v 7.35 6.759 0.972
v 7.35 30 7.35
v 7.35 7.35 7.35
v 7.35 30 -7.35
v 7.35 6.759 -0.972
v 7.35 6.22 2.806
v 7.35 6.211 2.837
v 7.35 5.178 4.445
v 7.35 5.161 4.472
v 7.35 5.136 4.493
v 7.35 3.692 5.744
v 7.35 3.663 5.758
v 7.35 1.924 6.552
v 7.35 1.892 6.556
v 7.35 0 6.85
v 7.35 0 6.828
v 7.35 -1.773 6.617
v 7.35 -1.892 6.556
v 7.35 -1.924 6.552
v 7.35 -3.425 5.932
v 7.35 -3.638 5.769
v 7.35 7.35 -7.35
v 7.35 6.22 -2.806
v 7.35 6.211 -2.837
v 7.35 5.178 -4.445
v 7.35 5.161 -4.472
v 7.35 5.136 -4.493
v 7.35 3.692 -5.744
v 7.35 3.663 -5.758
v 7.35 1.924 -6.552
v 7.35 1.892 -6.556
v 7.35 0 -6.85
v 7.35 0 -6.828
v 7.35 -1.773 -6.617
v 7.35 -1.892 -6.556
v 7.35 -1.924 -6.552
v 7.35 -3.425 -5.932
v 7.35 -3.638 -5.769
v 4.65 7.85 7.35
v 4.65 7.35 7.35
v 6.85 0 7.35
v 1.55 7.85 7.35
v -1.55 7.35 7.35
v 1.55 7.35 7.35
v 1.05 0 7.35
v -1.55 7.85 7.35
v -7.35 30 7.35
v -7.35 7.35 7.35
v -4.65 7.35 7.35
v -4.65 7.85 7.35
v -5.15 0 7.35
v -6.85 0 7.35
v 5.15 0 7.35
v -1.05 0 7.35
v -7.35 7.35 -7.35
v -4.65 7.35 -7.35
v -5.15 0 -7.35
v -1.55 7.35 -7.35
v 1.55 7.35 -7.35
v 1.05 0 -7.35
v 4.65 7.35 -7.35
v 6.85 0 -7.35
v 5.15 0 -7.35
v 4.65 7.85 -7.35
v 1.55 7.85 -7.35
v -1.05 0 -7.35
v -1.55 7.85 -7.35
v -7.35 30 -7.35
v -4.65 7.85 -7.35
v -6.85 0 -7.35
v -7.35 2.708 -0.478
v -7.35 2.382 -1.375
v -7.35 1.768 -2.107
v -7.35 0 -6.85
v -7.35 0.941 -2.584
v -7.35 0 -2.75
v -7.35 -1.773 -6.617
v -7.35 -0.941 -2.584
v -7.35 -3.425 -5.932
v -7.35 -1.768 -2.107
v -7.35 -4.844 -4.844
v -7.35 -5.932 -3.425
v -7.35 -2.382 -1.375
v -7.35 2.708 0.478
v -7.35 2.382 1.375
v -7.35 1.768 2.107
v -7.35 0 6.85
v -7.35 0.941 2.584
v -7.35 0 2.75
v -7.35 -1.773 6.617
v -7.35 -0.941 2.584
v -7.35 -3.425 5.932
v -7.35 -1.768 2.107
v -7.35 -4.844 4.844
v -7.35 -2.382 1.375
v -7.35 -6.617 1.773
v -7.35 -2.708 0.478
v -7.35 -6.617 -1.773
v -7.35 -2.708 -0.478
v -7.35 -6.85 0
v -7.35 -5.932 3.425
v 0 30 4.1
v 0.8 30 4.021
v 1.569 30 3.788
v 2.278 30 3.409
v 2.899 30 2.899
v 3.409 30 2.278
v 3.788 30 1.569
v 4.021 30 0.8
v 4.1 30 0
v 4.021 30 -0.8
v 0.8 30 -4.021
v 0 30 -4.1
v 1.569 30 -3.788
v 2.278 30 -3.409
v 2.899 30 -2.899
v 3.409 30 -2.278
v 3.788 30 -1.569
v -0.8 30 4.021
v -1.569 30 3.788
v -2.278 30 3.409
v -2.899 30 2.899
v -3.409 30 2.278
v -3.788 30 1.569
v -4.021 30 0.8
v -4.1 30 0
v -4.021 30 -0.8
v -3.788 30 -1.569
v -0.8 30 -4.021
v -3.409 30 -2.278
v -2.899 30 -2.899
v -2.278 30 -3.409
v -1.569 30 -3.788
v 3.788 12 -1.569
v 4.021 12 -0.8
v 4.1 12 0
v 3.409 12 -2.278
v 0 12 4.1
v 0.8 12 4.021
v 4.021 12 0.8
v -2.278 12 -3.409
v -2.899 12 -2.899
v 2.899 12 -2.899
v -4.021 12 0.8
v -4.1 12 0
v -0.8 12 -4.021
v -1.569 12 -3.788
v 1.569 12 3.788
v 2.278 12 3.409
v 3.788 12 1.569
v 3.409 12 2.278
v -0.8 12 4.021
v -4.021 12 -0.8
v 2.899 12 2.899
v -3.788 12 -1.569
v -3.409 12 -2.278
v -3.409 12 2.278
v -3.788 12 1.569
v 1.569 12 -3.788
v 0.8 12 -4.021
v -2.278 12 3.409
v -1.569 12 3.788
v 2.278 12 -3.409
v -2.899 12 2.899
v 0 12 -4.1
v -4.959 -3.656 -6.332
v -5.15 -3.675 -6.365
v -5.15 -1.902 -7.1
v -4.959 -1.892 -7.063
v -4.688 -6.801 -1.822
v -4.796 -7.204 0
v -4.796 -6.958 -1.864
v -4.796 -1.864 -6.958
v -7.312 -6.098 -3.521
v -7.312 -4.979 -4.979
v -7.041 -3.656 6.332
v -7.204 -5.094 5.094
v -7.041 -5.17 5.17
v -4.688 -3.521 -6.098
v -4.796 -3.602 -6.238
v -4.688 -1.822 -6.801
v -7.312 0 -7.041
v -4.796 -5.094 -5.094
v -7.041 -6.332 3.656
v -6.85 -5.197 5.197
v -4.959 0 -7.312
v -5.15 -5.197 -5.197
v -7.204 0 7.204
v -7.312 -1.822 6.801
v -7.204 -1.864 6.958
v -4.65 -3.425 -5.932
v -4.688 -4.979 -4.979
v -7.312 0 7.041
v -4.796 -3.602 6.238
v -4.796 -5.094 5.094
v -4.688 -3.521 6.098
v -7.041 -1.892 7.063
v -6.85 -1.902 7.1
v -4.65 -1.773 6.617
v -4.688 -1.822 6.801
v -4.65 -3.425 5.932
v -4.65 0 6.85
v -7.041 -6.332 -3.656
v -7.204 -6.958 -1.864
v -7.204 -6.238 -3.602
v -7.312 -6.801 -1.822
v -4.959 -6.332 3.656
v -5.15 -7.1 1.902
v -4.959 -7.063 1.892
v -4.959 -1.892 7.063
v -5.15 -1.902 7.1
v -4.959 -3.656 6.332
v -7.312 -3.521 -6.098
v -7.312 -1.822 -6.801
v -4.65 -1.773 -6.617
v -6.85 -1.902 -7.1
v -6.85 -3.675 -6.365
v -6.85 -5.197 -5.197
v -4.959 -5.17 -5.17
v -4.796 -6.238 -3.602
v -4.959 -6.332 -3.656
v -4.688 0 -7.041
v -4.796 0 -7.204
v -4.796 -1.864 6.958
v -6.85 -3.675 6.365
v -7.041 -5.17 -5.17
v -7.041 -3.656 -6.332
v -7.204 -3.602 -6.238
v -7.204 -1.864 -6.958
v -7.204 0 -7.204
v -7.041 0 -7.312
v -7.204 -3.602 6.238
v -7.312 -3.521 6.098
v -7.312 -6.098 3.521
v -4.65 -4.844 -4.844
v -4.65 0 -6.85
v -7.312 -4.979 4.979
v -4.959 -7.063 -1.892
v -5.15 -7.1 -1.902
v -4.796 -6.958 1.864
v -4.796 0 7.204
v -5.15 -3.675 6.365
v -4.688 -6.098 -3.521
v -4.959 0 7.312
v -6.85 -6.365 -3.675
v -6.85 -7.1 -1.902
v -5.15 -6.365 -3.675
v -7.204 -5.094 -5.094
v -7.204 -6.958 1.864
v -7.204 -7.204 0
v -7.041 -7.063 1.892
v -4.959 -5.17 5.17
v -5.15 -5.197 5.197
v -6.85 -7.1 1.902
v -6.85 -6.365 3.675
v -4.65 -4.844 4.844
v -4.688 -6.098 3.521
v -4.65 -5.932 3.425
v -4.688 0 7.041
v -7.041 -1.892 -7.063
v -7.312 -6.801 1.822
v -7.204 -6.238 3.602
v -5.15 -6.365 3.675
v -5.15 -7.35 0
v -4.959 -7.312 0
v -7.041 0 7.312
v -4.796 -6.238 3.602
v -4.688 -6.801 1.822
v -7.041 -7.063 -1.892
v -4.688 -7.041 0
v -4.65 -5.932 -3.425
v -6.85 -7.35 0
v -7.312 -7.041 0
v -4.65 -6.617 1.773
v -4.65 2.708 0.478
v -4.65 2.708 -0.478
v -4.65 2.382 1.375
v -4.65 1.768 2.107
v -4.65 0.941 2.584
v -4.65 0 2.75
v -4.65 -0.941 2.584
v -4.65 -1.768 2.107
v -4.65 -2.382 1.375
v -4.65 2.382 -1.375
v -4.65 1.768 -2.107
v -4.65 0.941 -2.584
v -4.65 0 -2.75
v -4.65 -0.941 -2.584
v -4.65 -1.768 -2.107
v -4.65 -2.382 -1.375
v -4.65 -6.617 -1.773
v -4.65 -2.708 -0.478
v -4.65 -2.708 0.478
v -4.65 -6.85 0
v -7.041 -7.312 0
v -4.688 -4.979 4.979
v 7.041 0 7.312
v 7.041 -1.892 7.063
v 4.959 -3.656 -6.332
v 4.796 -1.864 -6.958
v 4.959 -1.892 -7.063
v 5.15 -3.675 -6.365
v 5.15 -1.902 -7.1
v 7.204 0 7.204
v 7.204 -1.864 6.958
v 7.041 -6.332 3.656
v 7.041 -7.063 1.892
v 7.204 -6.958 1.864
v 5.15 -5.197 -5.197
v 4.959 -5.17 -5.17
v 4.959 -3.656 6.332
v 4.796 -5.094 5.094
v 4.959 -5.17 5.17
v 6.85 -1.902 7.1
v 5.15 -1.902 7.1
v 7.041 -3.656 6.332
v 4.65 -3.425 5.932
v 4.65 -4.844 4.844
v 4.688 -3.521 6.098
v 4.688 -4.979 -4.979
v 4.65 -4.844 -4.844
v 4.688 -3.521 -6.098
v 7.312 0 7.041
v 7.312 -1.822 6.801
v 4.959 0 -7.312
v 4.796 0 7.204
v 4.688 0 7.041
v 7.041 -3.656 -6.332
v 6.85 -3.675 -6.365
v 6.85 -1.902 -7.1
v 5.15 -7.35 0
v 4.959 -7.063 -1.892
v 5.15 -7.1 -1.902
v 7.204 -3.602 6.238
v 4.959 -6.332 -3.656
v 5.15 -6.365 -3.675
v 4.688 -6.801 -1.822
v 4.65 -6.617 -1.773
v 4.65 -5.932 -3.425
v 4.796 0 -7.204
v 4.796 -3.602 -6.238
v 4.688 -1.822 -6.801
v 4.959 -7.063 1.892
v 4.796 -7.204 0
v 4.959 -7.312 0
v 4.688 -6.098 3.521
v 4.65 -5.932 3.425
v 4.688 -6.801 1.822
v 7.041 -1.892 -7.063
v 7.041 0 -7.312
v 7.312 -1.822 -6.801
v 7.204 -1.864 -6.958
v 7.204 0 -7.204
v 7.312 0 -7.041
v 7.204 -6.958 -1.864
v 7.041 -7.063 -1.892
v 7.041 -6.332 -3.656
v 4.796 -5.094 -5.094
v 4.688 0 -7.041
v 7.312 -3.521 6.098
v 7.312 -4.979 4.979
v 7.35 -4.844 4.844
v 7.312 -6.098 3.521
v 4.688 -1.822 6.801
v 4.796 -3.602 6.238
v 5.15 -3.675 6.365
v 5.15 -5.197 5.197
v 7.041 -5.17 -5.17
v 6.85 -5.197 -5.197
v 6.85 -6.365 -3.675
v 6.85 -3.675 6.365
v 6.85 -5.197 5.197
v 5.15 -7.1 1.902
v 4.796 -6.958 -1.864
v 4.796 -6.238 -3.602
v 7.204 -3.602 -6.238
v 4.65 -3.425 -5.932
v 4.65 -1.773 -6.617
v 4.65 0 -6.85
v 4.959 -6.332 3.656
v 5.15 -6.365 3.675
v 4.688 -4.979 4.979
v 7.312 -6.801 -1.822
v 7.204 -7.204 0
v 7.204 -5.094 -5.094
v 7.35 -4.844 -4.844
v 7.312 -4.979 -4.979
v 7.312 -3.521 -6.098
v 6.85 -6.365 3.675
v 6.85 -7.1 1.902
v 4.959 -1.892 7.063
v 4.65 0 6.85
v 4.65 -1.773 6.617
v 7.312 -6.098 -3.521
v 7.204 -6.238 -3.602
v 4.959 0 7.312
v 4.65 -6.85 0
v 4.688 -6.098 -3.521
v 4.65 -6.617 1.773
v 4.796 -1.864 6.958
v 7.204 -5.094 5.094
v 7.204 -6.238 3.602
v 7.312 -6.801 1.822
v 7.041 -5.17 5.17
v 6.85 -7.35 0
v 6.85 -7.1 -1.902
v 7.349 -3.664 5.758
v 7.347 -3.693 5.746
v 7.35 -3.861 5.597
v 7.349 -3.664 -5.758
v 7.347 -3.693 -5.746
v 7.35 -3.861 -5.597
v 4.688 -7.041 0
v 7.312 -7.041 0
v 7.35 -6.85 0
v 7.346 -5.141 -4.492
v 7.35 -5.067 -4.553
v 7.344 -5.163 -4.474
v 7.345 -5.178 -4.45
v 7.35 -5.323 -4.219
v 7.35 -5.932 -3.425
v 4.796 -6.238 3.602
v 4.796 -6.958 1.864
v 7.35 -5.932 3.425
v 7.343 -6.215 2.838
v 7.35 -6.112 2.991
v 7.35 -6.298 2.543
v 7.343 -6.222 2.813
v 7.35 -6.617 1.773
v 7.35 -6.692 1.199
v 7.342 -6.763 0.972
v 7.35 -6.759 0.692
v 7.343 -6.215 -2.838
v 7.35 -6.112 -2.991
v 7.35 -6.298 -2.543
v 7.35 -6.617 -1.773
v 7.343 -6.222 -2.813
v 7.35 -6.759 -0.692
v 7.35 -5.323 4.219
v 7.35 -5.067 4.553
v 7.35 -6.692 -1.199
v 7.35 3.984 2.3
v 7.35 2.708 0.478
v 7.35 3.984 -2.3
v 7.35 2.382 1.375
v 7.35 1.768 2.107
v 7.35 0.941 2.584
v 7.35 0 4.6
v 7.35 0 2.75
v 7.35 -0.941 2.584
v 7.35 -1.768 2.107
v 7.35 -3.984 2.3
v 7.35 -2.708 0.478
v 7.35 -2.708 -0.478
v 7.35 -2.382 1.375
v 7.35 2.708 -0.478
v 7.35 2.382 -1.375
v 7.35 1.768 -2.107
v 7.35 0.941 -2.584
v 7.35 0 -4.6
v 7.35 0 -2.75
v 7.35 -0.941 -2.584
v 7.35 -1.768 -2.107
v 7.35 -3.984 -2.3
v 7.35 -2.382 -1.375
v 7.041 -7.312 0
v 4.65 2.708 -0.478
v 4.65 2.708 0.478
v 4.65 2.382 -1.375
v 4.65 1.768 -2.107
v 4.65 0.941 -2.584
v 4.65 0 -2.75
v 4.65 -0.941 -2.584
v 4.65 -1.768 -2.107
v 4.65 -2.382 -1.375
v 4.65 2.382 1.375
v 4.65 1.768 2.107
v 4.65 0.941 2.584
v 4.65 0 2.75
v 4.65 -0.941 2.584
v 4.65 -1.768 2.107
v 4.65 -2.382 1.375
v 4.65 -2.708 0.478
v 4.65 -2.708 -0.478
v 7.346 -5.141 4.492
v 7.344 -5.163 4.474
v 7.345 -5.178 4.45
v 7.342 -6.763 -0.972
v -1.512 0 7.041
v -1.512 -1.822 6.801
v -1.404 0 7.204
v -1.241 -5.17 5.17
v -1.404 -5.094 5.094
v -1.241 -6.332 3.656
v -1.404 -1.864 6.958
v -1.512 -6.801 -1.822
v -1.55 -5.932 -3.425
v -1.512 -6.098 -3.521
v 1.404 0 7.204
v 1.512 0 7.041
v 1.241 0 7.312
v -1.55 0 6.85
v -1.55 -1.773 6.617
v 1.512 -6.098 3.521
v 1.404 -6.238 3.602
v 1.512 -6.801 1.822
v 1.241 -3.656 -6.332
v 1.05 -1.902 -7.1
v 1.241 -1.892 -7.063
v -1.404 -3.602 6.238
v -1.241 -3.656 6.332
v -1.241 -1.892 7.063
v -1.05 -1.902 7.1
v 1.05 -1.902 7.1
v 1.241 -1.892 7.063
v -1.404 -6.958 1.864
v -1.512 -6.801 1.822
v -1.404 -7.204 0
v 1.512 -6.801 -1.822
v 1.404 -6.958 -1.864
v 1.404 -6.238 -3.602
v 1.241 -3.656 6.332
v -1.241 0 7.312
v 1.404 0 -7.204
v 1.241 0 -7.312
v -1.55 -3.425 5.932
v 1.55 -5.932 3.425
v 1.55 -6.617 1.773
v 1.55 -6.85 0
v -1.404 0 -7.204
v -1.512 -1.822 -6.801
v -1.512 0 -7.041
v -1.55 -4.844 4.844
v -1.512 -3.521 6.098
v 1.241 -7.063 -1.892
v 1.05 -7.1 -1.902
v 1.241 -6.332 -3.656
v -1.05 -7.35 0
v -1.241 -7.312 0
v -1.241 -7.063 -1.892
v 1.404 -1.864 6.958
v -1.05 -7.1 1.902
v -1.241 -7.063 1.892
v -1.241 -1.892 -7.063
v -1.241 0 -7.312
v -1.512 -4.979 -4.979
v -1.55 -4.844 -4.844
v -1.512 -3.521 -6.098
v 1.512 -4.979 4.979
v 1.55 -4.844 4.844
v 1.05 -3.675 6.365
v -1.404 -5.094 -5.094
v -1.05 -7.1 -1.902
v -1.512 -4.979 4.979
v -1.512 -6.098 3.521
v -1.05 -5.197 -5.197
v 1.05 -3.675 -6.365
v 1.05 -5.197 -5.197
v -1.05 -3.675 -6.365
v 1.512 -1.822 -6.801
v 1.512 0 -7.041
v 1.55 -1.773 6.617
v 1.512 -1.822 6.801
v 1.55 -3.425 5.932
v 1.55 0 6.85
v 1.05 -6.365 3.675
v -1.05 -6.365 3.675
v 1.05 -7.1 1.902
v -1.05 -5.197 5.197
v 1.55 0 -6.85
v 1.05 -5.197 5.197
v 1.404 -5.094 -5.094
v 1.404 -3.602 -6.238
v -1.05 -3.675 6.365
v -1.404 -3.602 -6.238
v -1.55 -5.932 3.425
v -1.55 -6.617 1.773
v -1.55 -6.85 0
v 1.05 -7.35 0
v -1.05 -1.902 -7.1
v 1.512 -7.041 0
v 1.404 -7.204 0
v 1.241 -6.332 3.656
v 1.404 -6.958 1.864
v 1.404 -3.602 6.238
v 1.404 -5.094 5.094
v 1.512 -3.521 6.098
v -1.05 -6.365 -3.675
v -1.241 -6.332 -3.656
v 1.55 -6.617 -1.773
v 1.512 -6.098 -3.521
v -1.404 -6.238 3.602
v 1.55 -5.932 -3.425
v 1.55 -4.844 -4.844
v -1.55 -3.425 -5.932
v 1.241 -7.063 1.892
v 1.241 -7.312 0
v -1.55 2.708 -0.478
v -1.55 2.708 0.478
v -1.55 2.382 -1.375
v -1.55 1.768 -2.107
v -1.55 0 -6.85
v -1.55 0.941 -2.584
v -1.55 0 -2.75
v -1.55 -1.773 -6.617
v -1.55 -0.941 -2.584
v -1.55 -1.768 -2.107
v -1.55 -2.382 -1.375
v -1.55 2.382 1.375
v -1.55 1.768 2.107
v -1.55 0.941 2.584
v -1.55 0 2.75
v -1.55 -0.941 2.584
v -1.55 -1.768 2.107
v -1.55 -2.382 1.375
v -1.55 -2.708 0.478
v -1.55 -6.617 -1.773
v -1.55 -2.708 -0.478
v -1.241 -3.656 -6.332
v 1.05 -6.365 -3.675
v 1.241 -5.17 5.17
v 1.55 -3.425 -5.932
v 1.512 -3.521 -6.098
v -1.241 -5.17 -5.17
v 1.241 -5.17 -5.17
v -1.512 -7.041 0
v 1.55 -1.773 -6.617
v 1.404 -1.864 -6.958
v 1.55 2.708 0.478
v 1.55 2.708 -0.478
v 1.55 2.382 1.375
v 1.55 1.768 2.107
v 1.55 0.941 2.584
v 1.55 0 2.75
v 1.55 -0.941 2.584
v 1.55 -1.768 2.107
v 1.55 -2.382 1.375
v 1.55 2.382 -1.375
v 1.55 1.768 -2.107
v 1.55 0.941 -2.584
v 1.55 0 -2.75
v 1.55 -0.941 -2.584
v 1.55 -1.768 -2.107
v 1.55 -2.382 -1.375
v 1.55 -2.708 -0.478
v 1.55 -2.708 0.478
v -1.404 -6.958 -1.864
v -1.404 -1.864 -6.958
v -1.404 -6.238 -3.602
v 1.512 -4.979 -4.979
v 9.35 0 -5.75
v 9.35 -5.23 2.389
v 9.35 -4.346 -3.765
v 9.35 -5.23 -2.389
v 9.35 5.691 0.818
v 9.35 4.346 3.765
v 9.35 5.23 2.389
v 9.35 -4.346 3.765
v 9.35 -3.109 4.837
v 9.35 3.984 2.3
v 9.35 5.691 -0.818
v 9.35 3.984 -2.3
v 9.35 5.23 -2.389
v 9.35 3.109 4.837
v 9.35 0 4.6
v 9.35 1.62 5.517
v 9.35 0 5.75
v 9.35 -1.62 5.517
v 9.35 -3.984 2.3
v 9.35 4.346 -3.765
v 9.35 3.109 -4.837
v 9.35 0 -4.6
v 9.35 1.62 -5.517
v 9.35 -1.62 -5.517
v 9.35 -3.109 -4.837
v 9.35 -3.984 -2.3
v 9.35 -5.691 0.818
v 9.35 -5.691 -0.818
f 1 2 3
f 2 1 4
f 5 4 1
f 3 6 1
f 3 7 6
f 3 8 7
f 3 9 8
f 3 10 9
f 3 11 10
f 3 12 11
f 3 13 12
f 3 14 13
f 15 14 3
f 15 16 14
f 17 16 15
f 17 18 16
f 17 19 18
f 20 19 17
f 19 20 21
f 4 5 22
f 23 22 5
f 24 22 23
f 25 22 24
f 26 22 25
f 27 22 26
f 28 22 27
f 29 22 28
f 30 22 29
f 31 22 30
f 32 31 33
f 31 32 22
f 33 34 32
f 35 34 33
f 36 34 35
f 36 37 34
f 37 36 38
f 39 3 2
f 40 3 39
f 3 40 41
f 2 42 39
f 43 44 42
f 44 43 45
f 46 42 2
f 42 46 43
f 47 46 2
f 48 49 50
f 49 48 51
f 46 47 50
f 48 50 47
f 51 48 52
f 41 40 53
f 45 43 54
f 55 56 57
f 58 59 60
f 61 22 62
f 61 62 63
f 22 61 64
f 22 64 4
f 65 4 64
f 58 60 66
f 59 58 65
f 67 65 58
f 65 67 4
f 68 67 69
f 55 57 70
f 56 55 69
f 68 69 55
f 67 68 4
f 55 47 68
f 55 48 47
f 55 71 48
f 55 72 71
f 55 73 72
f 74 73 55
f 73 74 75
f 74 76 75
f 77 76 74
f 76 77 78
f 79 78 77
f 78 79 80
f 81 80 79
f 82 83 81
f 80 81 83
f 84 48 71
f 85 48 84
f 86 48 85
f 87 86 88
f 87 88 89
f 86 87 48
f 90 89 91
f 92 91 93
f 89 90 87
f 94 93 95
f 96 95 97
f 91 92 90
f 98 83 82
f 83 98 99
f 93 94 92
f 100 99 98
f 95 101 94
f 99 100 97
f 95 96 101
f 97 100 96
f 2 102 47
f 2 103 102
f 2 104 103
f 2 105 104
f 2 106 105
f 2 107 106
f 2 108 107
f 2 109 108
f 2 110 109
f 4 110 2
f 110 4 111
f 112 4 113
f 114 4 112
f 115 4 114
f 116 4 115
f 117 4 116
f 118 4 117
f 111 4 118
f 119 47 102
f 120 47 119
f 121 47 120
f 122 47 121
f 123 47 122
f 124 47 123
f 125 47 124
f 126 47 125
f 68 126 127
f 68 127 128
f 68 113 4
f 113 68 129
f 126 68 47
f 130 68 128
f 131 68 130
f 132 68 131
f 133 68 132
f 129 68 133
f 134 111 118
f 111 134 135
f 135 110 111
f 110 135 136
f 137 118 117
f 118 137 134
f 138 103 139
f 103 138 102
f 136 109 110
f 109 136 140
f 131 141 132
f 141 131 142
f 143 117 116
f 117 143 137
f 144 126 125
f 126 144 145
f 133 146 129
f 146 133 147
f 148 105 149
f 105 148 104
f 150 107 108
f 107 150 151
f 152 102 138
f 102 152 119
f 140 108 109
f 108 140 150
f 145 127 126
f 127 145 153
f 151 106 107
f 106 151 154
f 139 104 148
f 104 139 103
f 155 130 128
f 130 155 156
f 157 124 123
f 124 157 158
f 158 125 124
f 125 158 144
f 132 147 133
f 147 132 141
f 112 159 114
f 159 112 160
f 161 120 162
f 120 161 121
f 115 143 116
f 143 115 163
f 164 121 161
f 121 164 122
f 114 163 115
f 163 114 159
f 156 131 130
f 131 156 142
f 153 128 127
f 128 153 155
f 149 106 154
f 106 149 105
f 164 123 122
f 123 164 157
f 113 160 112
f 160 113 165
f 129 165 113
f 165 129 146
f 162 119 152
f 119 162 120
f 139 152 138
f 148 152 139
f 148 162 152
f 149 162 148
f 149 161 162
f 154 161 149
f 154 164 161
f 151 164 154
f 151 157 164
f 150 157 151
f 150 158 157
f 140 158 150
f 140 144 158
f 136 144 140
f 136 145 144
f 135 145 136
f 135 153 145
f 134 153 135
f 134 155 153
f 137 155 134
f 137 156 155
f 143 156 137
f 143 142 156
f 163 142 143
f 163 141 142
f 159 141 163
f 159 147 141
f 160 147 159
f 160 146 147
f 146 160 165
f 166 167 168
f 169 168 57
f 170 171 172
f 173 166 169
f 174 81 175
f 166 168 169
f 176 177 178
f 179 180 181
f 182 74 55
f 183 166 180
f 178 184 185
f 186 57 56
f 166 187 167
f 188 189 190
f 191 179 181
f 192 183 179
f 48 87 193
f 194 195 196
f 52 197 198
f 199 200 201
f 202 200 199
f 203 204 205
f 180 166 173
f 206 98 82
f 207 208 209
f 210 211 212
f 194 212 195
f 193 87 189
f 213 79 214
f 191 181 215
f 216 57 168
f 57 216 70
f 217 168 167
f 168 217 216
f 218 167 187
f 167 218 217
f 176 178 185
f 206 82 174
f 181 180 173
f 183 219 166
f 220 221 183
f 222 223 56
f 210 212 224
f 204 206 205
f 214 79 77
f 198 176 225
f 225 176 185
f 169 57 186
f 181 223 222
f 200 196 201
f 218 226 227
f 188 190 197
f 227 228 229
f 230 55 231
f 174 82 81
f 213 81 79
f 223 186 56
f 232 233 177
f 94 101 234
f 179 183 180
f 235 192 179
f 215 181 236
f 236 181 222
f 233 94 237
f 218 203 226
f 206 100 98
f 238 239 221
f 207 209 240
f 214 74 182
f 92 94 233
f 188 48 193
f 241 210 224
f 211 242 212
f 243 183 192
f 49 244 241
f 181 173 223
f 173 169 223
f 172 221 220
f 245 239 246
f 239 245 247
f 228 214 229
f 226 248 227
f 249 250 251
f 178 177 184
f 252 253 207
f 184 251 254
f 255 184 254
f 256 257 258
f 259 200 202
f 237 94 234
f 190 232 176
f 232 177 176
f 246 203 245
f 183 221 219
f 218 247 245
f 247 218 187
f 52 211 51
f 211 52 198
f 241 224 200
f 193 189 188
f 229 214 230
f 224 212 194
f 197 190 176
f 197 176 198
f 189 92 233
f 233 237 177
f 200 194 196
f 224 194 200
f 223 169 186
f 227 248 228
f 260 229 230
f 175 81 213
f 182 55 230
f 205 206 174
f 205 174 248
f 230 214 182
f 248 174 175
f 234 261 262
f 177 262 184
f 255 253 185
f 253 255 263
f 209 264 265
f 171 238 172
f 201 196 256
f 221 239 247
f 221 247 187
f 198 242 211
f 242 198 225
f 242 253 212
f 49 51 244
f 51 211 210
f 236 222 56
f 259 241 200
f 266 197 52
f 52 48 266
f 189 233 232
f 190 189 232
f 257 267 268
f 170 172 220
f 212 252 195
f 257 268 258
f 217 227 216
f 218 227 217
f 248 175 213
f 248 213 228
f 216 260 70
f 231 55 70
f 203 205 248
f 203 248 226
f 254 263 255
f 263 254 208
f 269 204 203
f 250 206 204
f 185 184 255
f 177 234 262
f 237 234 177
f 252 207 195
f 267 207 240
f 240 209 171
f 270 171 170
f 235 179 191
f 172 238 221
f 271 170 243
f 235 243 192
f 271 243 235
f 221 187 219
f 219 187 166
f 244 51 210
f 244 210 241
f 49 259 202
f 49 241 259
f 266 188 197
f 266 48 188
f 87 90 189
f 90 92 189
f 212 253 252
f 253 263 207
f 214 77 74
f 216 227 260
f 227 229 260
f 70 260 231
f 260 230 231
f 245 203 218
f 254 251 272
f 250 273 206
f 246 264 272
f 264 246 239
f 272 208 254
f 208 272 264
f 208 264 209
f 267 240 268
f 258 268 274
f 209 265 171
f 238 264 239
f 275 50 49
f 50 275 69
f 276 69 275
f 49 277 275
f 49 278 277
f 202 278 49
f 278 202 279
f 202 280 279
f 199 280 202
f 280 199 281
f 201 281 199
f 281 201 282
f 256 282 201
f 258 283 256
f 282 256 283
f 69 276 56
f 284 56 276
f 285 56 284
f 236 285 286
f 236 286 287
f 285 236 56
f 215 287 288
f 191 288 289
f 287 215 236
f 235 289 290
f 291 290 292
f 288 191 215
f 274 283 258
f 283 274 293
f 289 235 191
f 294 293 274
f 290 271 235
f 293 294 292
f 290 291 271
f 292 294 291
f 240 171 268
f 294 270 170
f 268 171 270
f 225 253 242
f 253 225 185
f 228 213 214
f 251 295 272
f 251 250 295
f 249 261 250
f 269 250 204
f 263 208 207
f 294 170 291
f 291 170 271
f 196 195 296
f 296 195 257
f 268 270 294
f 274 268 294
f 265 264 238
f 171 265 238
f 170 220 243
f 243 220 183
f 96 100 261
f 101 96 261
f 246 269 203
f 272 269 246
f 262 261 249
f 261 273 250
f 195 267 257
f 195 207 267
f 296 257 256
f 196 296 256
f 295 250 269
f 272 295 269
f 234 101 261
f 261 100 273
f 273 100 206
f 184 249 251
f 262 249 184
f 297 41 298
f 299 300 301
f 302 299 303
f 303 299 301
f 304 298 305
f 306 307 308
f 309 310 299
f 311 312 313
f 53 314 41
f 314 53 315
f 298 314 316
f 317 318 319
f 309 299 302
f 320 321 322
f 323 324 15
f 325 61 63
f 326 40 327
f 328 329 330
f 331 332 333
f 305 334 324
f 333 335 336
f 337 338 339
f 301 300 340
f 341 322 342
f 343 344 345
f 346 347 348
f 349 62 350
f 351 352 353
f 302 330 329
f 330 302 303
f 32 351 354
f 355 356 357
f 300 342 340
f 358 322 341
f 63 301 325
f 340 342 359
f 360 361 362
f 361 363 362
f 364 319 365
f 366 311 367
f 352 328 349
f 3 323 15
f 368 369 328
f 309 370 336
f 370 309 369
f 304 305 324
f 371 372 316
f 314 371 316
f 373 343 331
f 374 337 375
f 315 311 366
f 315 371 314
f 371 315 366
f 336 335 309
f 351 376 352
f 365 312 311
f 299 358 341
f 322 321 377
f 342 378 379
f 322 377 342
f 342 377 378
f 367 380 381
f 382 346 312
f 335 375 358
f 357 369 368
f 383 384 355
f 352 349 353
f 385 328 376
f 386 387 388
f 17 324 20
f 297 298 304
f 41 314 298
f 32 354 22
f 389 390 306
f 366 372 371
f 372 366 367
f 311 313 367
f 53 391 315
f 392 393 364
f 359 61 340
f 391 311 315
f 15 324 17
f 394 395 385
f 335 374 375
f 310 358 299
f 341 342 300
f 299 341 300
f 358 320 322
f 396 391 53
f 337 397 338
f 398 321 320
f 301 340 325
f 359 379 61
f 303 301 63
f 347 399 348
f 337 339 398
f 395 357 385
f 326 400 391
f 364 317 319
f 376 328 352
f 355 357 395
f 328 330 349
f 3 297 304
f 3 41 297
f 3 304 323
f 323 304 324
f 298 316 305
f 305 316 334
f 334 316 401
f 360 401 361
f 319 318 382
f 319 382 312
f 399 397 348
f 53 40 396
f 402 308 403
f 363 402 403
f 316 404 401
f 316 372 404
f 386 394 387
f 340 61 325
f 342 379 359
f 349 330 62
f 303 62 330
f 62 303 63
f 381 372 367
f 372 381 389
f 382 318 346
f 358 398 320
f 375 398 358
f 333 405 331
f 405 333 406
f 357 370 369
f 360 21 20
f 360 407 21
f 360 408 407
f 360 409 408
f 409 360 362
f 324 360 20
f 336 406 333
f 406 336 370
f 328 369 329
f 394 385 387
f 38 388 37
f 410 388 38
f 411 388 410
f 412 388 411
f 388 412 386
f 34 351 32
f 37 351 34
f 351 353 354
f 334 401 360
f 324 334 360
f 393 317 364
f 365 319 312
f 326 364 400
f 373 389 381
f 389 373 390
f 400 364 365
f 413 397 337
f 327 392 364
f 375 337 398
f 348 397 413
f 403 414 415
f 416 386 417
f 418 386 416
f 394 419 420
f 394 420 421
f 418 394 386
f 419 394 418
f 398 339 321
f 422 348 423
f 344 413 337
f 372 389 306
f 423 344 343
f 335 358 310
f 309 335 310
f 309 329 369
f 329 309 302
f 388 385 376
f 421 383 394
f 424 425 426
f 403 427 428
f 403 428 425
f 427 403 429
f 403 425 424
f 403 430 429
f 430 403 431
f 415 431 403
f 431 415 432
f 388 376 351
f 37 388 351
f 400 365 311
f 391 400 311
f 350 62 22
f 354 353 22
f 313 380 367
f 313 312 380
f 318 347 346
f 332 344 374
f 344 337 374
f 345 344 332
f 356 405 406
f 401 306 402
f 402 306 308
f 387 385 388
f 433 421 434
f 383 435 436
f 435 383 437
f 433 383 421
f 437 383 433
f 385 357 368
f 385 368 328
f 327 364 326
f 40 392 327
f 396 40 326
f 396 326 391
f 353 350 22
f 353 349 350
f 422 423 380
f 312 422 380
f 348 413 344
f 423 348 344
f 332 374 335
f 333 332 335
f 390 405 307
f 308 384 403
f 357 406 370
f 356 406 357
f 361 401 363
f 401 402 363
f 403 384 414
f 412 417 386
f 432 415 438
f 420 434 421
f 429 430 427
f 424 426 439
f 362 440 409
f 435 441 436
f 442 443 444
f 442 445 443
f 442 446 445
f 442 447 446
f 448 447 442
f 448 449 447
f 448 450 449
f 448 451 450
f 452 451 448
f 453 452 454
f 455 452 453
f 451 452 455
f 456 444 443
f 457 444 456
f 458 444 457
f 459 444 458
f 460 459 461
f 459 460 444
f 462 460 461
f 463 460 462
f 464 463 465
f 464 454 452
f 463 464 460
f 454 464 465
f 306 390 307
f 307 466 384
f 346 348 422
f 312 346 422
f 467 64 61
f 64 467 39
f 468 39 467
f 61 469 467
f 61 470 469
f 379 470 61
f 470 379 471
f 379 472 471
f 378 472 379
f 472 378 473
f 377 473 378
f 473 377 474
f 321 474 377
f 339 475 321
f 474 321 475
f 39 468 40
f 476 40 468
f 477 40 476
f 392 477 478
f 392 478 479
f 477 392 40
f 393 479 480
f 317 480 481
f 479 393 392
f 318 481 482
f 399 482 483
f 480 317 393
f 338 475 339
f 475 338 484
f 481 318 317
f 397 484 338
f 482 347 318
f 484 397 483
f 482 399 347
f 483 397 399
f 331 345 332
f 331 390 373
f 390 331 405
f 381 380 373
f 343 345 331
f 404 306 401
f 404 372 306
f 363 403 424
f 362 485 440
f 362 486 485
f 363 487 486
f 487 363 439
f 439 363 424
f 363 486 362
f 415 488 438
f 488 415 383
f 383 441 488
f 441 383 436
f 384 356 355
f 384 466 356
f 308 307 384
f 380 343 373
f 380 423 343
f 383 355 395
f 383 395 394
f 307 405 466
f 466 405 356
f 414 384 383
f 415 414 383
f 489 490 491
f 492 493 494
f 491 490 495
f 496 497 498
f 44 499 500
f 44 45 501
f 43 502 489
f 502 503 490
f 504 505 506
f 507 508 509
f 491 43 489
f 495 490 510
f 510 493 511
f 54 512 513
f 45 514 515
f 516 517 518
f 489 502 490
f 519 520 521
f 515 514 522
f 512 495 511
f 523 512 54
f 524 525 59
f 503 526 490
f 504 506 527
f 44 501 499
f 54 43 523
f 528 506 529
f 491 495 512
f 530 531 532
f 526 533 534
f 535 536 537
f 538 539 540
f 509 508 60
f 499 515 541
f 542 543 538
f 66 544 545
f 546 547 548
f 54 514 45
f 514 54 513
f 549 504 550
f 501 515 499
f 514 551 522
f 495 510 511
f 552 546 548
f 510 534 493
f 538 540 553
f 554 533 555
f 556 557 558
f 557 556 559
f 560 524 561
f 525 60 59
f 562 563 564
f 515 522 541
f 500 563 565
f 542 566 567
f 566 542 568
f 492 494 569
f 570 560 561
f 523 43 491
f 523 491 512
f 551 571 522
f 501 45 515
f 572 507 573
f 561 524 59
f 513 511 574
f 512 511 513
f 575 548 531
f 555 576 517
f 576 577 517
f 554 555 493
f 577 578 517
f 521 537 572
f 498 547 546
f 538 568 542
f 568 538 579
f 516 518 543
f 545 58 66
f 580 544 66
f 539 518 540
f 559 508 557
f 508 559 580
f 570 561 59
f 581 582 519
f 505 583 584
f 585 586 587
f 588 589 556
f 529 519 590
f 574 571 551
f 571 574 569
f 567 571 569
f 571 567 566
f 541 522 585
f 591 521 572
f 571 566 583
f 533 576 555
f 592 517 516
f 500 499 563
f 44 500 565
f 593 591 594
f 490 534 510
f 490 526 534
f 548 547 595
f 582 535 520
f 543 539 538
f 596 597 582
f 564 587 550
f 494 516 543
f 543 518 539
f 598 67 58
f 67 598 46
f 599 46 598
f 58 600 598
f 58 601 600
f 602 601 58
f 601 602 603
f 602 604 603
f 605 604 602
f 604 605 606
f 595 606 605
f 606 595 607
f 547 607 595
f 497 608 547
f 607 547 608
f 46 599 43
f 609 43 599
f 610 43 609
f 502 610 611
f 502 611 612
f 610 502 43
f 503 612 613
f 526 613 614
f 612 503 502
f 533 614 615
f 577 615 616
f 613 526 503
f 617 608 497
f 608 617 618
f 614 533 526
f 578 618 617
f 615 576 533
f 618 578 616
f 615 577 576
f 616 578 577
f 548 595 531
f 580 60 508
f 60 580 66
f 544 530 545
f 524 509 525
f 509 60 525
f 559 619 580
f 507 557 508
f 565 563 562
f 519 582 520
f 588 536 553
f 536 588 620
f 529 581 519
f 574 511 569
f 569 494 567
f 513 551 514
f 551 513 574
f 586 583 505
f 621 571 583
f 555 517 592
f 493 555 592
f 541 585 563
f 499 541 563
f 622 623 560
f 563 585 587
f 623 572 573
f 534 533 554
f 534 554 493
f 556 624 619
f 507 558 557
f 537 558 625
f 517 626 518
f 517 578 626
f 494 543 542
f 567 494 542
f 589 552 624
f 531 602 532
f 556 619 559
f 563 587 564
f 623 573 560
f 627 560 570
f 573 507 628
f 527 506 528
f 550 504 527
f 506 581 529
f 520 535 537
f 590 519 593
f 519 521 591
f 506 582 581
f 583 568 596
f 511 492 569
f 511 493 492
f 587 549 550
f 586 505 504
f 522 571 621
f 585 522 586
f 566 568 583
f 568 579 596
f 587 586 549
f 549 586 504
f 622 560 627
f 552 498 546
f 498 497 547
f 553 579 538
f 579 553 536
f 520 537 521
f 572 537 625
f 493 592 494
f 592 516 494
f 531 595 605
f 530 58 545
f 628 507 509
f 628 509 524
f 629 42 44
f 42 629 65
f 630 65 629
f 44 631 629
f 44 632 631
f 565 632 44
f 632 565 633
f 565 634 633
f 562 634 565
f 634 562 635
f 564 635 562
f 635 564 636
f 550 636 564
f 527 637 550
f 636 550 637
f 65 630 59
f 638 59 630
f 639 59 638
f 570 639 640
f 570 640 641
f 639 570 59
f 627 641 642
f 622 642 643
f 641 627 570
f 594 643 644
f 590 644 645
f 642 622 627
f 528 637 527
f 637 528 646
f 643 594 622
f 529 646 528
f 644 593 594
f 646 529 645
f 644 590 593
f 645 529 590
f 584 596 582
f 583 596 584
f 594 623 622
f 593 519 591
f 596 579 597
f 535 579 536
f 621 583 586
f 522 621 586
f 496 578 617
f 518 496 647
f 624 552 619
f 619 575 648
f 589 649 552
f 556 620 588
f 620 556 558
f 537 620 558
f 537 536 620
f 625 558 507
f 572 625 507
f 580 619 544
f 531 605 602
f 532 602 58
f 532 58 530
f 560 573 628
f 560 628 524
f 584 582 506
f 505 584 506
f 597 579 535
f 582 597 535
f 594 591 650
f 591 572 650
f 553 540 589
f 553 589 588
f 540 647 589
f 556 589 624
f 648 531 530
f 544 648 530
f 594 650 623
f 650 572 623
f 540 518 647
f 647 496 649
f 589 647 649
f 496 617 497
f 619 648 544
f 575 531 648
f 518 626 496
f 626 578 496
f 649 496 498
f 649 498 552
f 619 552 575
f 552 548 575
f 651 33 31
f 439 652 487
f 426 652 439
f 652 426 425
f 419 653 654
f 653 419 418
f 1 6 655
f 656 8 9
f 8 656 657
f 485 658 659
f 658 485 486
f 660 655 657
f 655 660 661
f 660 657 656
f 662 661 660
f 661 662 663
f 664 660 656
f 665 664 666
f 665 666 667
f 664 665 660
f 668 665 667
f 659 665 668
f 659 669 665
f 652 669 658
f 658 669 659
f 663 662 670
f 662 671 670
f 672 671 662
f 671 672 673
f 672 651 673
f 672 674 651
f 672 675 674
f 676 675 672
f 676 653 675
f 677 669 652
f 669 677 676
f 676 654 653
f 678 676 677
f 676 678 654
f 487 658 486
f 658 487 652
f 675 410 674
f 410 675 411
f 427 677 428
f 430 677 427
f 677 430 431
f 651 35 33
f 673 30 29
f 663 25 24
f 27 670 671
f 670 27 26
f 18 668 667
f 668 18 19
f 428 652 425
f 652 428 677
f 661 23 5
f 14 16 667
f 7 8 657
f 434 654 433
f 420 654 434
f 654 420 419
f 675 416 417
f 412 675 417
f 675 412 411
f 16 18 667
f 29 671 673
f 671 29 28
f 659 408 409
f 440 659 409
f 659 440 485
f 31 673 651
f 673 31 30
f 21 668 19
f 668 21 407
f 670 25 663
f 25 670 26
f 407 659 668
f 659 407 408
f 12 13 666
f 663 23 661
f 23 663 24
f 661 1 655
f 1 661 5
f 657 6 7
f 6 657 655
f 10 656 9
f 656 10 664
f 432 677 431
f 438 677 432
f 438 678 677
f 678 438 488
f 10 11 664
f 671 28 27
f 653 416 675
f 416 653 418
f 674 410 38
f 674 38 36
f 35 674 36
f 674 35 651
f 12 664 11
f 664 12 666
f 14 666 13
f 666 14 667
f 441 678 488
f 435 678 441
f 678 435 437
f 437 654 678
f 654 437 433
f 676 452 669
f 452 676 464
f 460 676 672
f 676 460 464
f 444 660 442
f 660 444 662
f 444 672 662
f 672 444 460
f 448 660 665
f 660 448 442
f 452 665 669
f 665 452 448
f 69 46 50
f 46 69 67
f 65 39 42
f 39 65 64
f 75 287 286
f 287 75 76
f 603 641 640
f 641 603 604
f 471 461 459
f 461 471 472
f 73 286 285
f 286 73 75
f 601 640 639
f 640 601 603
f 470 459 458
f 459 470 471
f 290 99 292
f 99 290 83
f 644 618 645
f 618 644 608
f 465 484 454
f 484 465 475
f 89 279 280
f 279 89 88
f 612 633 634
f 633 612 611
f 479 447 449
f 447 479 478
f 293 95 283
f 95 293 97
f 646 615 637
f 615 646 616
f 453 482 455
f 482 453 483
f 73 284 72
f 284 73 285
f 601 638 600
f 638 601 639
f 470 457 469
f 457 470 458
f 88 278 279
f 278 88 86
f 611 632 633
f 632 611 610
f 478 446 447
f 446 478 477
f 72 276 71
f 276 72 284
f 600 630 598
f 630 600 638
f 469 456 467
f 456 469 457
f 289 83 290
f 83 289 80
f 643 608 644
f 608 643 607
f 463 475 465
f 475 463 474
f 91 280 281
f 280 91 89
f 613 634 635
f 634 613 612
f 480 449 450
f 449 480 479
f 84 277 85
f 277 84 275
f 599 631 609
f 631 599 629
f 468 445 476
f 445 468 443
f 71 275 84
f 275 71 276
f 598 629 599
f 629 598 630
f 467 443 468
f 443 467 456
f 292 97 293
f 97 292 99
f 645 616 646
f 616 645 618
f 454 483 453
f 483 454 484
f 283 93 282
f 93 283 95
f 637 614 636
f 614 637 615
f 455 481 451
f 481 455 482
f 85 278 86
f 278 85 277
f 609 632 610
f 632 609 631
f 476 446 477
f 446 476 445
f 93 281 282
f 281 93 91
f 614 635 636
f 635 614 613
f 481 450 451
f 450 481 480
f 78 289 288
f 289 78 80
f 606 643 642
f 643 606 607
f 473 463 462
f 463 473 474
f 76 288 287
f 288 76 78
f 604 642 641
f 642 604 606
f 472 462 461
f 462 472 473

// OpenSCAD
/* [Main] */

s=14.7;

difference(){
    translate([-s/2,10,-s/2])
    cube([s,20,s]);
    
    translate([0,12,0])
    rotate([-90,0,0])
    cylinder(d=8.2, h=25, $fn=32);
}

// First head kind ("example" show them all but is not printable)
gopro_primary="triple"; // [example,triple,double]
// The other head kind (only for the triple or double primary kind)
gopro_secondary_what="none"; // [double,triple,rod,clamp,none]
// If ever you rotate the seconday head you will probably need to enable support to print it
gopro_secondary_rotated=1; // [0:false,1:true]

// Optional axis-to-axis extension rod (hence, it cannot be less than 20.7)
gopro_ext_len=21;
// The wall thickness of the extension rod (2 to 6mm are good values)
gopro_ext_th=3;

/* [Rod and captive nut] */

// This tab is useful only if you have selected "rod" as the secondary head. The optional rod diameter (also the captive nut internal diameter)
gopro_captive_rod_id= 3.8;
// The angle the rod makes with the axis (0 is colinear, 90 is a right angle)
gopro_captive_rod_angle= 45; // [0:90]
// Optional captive nut thickness with freeplay (tightest would be 3.2)
gopro_rod_nut_th= 3.6;
// Optional captive nut diameter with freeplay (from corner to corner)
gopro_rod_nut_od= 8.05;
// How much is the protruding output of the rod on the rod attachment (can be zero), useful if you don't want a captive nut with still a tight coupling
gopro_captive_protruding_h= 0.5;

/* [Clamp/bar mount] */

// This tab is useful only if you have selected "clamp" as the secondary head.  The optional (handle)bar diameter
gopro_bar_rod_d= 17;
// How thick is the ring around the bar
gopro_bar_th= 3.2;
// How big is the gap between the jaws
gopro_bar_gap= 10;
// The jaw screw diameter
gopro_bar_screw_d= 4;
// The diameter of the head of the screw
gopro_bar_screw_head_d= 6.2;
// The diameter of the nut of the screw from corner to corner (can be zero)
gopro_bar_screw_nut_d= 6.01;
// How thick are the shoulders on which to bolt (each side)
gopro_bar_screw_shoulder_th=4.5;
// Whether to reverse the bolt orientation (from which side you will screw the bolt, defaut is from the joint)
gopro_bar_screw_reversed=true; // [true,false]

/* [Hidden] */

// The gopro connector itself (you most probably do not want to change this but for the first two)

// The locking nut on the gopro mount triple arm mount (keep it tight)
gopro_nut_d= 9.2;
// How deep is this nut embossing (keep it small to avoid over-overhangs)
gopro_nut_h= 2;
// Hole diameter for the two-arm mount part
gopro_holed_two= 5;
// Hole diameter for the three-arm mount part
gopro_holed_three= 5.5;
// Thickness of the internal arm in the 3-arm mount part
gopro_connector_th3_middle= 3.1;
// Thickness of the side arms in the 3-arm mount part
gopro_connector_th3_side= 2.7;
// Thickness of the arms in the 2-arm mount part
gopro_connector_th2= 3.04;
// The gap in the 3-arm mount part for the two-arm
gopro_connector_gap= 3.1;
// How round are the 2 and 3-arm parts
gopro_connector_roundness= 1;
// How thick are the mount walls
gopro_wall_th= 3;

gopro_connector_wall_tol=0.5+0;
gopro_tol=0.04+0;

// Can be queried from the outside
gopro_connector_z= 2*gopro_connector_th3_side+gopro_connector_th3_middle+2*gopro_connector_gap;
gopro_connector_x= gopro_connector_z;
gopro_connector_y= gopro_connector_z/2+gopro_wall_th;

///////////////////////////////////////////////////////////////////////
//
// GoPro Hero mount and joint (gopro_mounts_mooncactus.scad) - Rev 1.03
//
///////////////////////////////////////////////////////////////////////
//
// CC-BY-NC 2013 jeremie.francois@gmail.com
// http://www.thingiverse.com/thing:62800
// http://betterprinter.blogspot.com
//

// It slices neatly on an ultimaker with the following parameters
//
// 0.1 mm layers (for better look & more compact FDM) -- 0.15 is still OK (and faster)
// 0.8 mm walls (loops->infill->perimeters)
// 0.8 mm bottom/top
// 100% fill (probably safer, though 30% is quite OK)
//
// Rev 1.01: fixed printing angle vs captive nut slot, added a slight freeplay
// Rev 1.02: added handle/bar mount and rounded the angles of the rod mount
// Rec 1.03: examples and first release (20130317-1234)

/* ****************************************************************

HOW TO USE IN YOUR OWN DESIGNS

use <gopro_mounts_mooncactus.scad>

// Create a "triple" gopro connector
gopro_connector("triple");

// Create a "triple" gopro connector without the locking nut shape
translate([30,0,0])
	gopro_connector("triple", withnut=false);

// Create a "double" gopro connector
translate([60,0,0])
	gopro_connector("double");

// Add a bar mount/clamp to one of the connector
translate([90,0,0])
gopro_bar_clamp(
	rod_d= 31, // rod diameter
	th= 3.2, // main thickness
	gap= 2.4, // space between the clamps
	screw_d= 3, // screw diameter
	screw_head_d= 6.2, // screw head diameter
	screw_nut_d= 6.01, // nut diameter from corner to corner
	screw_shoulder_th=4.5, // thickness of the shoulder on which the nut clamps
	screw_reversed=false	 // true to mirror the orientation of the clamp bolts
);

// Extends a connector with a mount for a rod and an optional embedded nut
translate([120,0,0])
gopro_rod_connect(
	rod_id=3.8, // rod diameter
	angle=80,  // rod angle (0 is straight, 90 is a right turn)
	nut_th=3.2, // embedded nut thickness (can be zero to disable the embedded nut)
	nut_od=7.9 // nut diameter from corner to corner
);

// How to build a linear extruded bar extender
translate([0,65,0])
{
	gopro_connector("double");
	gopro_extended(len=50, th=3)
		scale([1,-1,1])
				gopro_connector("triple");
}

// The following dimensions are useful to attach the mount to your design:
	gopro_connector_z= 14.7;
	gopro_connector_x= 14.7;
	gopro_connector_y= 10.35;


// Finally, note that the arm are designed in a way which is not the best orientation to print: you would better rotate them with, eg. rotate([0,90,0])

**************************************************************** */



// To generate the sample set in bash, just copy/paste the following in a terminal:
/*
for kind in double triple; do
	for angle in 30 80; do
		through=true
		[[ $angle == 0 ]] && through=false
		openscad -D print_it=true -D gopro_primary="\"$kind\"" -D gopro_captive_rod_angle=$angle -o gmb_${kind}_${angle}.stl gopro_mount_bit.scad
	done
	openscad -D print_it=true -D gopro_primary="\"$kind\"" -D gopro_rod_nut_th=0 -o gmb_${kind}_simple.stl gopro_mount_bit.scad
done
*/


//
// ================ Full (colored) example (for openscad & command line)
//
gopro_ext_len_real= (gopro_ext_len > 2*gopro_connector_y ? gopro_ext_len : 0);
if(gopro_primary=="example")
{
	gopro_connector("triple", withnut=true);
	
	color([1,0.2,0.2])
		gopro_bar_clamp(
			rod_d= gopro_bar_rod_d, th=gopro_bar_th, gap=gopro_bar_gap,
			screw_d= gopro_bar_screw_d, screw_head_d= gopro_bar_screw_head_d, screw_nut_d= gopro_bar_screw_nut_d, screw_shoulder_th= gopro_bar_screw_shoulder_th,
			screw_reversed= gopro_bar_screw_reversed	);
			
	rotate([0,180,130]) color([0.2,0.2,1])
		gopro_connector("double");
		
	rotate([0,180,130]) color([0,0.8,0])
		gopro_rod_connect(nut_th=gopro_rod_nut_th, nut_od=gopro_rod_nut_od, rod_id=gopro_captive_rod_id, angle=gopro_captive_rod_angle);

	translate([-35,-10,0]) color([0.6,0.6,0.6])
	rotate([0,0,10])
	{
		gopro_connector("double");
		gopro_extended(len=gopro_ext_len, th=gopro_ext_th)
		{
			scale([1,-1,1])	gopro_connector("triple");
			// or (eg.)
//			translate([0,-2*gopro_connector_y,0]) gopro_bar_clamp(rod_d= 20, th= 5, gap= 5, screw_d= 3, screw_head_d= 6.2, screw_nut_d= 6.01, screw_shoulder_th=4.5, screw_reversed=true);
		}
	}
}
else // useful blocks
{
	//
	// ================ Printable standalone blocks (for the customizer)
	//
	rotate([0,90,0])
	{
		if(gopro_primary=="triple")
			gopro_connector("triple", withnut=true);
		else
			gopro_connector("double");

		gopro_extended(len=gopro_ext_len_real, th=gopro_ext_th) {}
		translate([0,gopro_ext_len_real>0 ? gopro_ext_len_real-gopro_connector_y*2 : 0,0])
		{
			rotate([0,gopro_secondary_rotated?-90:0,0])
			if(gopro_secondary_what=="double" || gopro_secondary_what=="triple")
			{
				translate([0,gopro_connector_y*2,0])
					scale([1,-1,1])
				if(gopro_secondary_what=="triple")
					gopro_connector("triple", withnut=true);
				else if(gopro_secondary_what=="double")
					gopro_connector("double");
			}
			else if(gopro_secondary_what=="rod" && gopro_captive_rod_id>0) // Optional captive nut
			{
				gopro_rod_connect(nut_th=gopro_rod_nut_th, nut_od=gopro_rod_nut_od, rod_id=gopro_captive_rod_id, angle=gopro_captive_rod_angle);
			}
			else if(gopro_secondary_what=="clamp" && gopro_bar_rod_d>0) // Optional bar mount (can't be both!)
			{
				rotate([0,90,0])
					gopro_bar_clamp(
						rod_d= gopro_bar_rod_d,
						th= gopro_bar_th,
						gap= gopro_bar_gap,
						screw_d= gopro_bar_screw_d,
						screw_head_d= gopro_bar_screw_head_d,
						screw_nut_d= gopro_bar_screw_nut_d,
						screw_shoulder_th= gopro_bar_screw_shoulder_th,
						screw_reversed= gopro_bar_screw_reversed
					);
			}
		}
	}
}



//
// ============================= GOPRO CONNECTOR =============================
//

module gopro_torus(r,rnd)
{
	translate([0,0,rnd/2])
		rotate_extrude(convexity= 10)
			translate([r-rnd/2, 0, 0])
				circle(r= rnd/2, $fs=0.2);
}

module gopro_rcyl(r,h, centered, rnd=1)
{
	translate([0,0,center ? -h/2 : 0])
	hull() {
		translate([0,0,0]) gopro_torus(r=r, rnd=rnd);
		translate([0,0,h-rnd]) gopro_torus(r=r, rnd=rnd);
	}
}

module gopro_connector(version="double", withnut=true, captive_nut_th=0, captive_nut_od=0, captive_rod_id=0, captive_nut_angle=0)
{
	module gopro_profile(th)
	{
		hull()
		{
			gopro_torus(r=gopro_connector_z/2, rnd=gopro_connector_roundness);
			translate([0,0,th-gopro_connector_roundness])
				gopro_torus(r=gopro_connector_z/2, rnd=gopro_connector_roundness);
			translate([-gopro_connector_z/2,gopro_connector_z/2,0])
				cube([gopro_connector_z,gopro_wall_th,th]);
		}
	}
	difference()
	{
		union()
		{
			if(version=="double")
			{
				for(mz=[-1:2:+1]) scale([1,1,mz])
						translate([0,0,gopro_connector_th3_middle/2 + (gopro_connector_gap-gopro_connector_th2)/2]) gopro_profile(gopro_connector_th2);
			}
			if(version=="triple")
			{
				translate([0,0,-gopro_connector_th3_middle/2]) gopro_profile(gopro_connector_th3_middle);
				for(mz=[-1:2:+1]) scale([1,1,mz])
					translate([0,0,gopro_connector_th3_middle/2 + gopro_connector_gap]) gopro_profile(gopro_connector_th3_side);
			}

			// add the common wall
			translate([0,gopro_connector_z/2+gopro_wall_th/2+gopro_connector_wall_tol,0])
				cube([gopro_connector_z,gopro_wall_th,gopro_connector_z], center=true);

			// add the optional nut emboss
			if(version=="triple" && withnut)
			{
				translate([0,0,gopro_connector_z/2-gopro_tol])
				difference()
				{
					cylinder(r1=gopro_connector_z/2-gopro_connector_roundness/2, r2=11.5/2, h=gopro_nut_h+gopro_tol);
					cylinder(r=gopro_nut_d/2, h=gopro_connector_z/2+3.5+gopro_tol, $fn=6);
				}
			}
		}
		// remove the axis
		translate([0,0,-gopro_tol])
			cylinder(r=(version=="double" ? gopro_holed_two : gopro_holed_three)/2, h=gopro_connector_z+4*gopro_tol, center=true, $fs=1);
	}
}

//
// ============================= CAPTIVE NUT/ROD =============================
//

module gopro_rod_connect(nut_od, rod_id, nut_th, angle=0)
{
	if( (nut_th>0 && nut_od>0) || rod_id>0 )
	translate([0,gopro_connector_z,0])
	{
		difference()
		{
			// Main body mass
			difference()
			{
				hull()
				{
					translate([0,-gopro_connector_z/2+gopro_wall_th,0]) // attachment
						cube([gopro_connector_z,gopro_tol,gopro_connector_z], center=true);

					// main cylinder
					translate([gopro_connector_z/8,gopro_connector_z/4,0]) scale([0.75,0.5,1]) // optional
					gopro_rcyl(r=gopro_connector_z/2, h=gopro_connector_z, center=true, rnd=3);

					// nozzle
					rotate([0,0,angle])
						translate([0,gopro_connector_z/2-gopro_tol,0])
							rotate([-90,0,0])
							{
								hull()
								{
									translate([0,0,-1.5]) gopro_torus(r=gopro_connector_z/2, rnd=1.5);
									translate([0,0,gopro_captive_protruding_h-1])
									gopro_torus(r=nut_od/2, rnd=1);
								}
							}
				}

				// Captive nut slot
				if(nut_th>0 && nut_od>0)
				{
					translate([0,0,0])
						rotate([0,(angle<18)?180:0,angle]) // easier print only for small angles
							hull()
					{
						rotate([-90,0,0]) cylinder(r=nut_od/2, h=nut_th+2*gopro_tol, $fn=6, center=true);
						translate([gopro_connector_z,0,0])
							rotate([-90,0,0]) cylinder(r=nut_od/2, h=nut_th+2*gopro_tol, $fn=6, center=true);
					}
				}
			}

			// Carve the rod void
			if(rod_id>0)
			{
				rotate([0,0,angle])
				{
					if(angle>=80 || angle<=-80)
						rotate([-90,30,0])
							cylinder(r=rod_id/2, h=gopro_connector_z+2*gopro_captive_protruding_h+2*gopro_tol, $fs=0.2, center=true);
					else
						translate([0,gopro_wall_th+gopro_tol*2-nut_th/2,0])
							rotate([-90,30,0])
							cylinder(r=rod_id/2, h=gopro_connector_z/2+gopro_captive_protruding_h+gopro_tol, $fs=0.2);
				}
			}
		}
	}
}

//
// ============================= BAR CLAMP =============================
//

module gopro_bar_clamp(
	rod_d= 31,
	th= 3.2,
	gap= 2.4,
	screw_d= 3,
	screw_head_d= 6.2,
	screw_nut_d= 6.01,
	screw_shoulder_th=4.5,
	screw_reversed=1
	)
{
	module clamp_profile(r)
	{
		scale([r,r,1])
			translate([0,rod_d/2,0])
				cylinder(r=rod_d/2 + th,h=gopro_tol);
	}
	
	screw_x= rod_d/2+screw_head_d/2;
	translate([0,gopro_connector_z,0])
	difference()
	{
		hull()
		{
			translate([0,-gopro_connector_z/2+gopro_wall_th,0]) // attachment
				cube([gopro_connector_z,gopro_tol,gopro_connector_z], center=true);

			clamp_profile(1);
			for(m=[-1:2:+1]) scale([1,1,m])
				translate([0,0,-gopro_connector_z/2])
					clamp_profile((rod_d-0.8)/rod_d);

			// Shoulder screw support
			for(m=[-1:2:-1]) scale([m,1,1])
			{
				translate([screw_x,rod_d/2,gopro_tol/2])
					rotate([90,0,0])
						translate([0,0,-(gap+th*2)/2])
							cylinder(r=screw_head_d/2+0.78,h=gap+th*2);
			}
			
		}

		translate([0,rod_d/2,0])
		{
			// Main hole and gap
			translate([0,0,-gopro_tol-gopro_connector_z/2])
				cylinder(r=rod_d/2,h=gopro_connector_z+2*gopro_tol, $fs=1); // inner
				
			// Gap
            translate([-gopro_connector_z,0,0]) //ch
			cube([screw_x*2 + screw_head_d*2, gap, gopro_connector_z+2*gopro_tol+1],center=true);

			// Screws
			for(mx=[-1:2:-1]) scale([mx,1,1]) //ch mx=[-1:2:+1]
			{
				translate([screw_x,0,0]) rotate([90,0,0])
				{
						translate([0,0,-rod_d/2-screw_shoulder_th]) cylinder(r=screw_d/2,h=rod_d+2*screw_shoulder_th,$fs=0.5); // screw axis
						if(screw_head_d>0)
							scale([1,1,screw_reversed?-1:1])
								translate([0,0,gap/2+screw_shoulder_th])
									cylinder(
										r1=screw_head_d/2,
										r2=1.5*screw_head_d/2,
										h=rod_d/2,$fs=0.5); // screw head
						if(screw_nut_d>0)
							scale([1,1,screw_reversed?1:-1])
								translate([0,0,gap/2+screw_shoulder_th])
									rotate([0,0,30])
										cylinder(
											r1=screw_nut_d/2,
											r2=1.5*screw_nut_d/2,
											h=rod_d/2,$fn=6); // screw nut
				}
			}

		}
	}
}


module gopro_extended(len, th=3)
{
	linlen= len - 2*gopro_connector_y;
	if(linlen>0)
	{
		translate([0,gopro_connector_y,0])
		{
			rotate([90,0,0])
				translate([0,0,-linlen/2])
					linear_extrude(height = linlen, center = true, convexity = 10)
			{
				for(r=[45:90:360]) rotate([0,0,r])
					hull()
					{
						// corners
						translate([sqrt(2)*(gopro_connector_x/2-th/2),0,0])
						{
							intersection()
							{
								rotate([0,0,45]) square([th,th],center=true);
								circle(r=1.2*th/2,$fs=0.5);
							}
						}
						circle(r=th/2);
					}
					// Internal roundness
					difference()
					{
						square([th*2,th*2],center=true);
						for(r=[0:90:360]) rotate([0,0,r])
							translate([0,th*sqrt(2)]) circle(r=th/2,$fs=0.5);
					}
			}
			*translate([0,linlen+gopro_connector_y,0])
				children(0);
		}
	}
}
